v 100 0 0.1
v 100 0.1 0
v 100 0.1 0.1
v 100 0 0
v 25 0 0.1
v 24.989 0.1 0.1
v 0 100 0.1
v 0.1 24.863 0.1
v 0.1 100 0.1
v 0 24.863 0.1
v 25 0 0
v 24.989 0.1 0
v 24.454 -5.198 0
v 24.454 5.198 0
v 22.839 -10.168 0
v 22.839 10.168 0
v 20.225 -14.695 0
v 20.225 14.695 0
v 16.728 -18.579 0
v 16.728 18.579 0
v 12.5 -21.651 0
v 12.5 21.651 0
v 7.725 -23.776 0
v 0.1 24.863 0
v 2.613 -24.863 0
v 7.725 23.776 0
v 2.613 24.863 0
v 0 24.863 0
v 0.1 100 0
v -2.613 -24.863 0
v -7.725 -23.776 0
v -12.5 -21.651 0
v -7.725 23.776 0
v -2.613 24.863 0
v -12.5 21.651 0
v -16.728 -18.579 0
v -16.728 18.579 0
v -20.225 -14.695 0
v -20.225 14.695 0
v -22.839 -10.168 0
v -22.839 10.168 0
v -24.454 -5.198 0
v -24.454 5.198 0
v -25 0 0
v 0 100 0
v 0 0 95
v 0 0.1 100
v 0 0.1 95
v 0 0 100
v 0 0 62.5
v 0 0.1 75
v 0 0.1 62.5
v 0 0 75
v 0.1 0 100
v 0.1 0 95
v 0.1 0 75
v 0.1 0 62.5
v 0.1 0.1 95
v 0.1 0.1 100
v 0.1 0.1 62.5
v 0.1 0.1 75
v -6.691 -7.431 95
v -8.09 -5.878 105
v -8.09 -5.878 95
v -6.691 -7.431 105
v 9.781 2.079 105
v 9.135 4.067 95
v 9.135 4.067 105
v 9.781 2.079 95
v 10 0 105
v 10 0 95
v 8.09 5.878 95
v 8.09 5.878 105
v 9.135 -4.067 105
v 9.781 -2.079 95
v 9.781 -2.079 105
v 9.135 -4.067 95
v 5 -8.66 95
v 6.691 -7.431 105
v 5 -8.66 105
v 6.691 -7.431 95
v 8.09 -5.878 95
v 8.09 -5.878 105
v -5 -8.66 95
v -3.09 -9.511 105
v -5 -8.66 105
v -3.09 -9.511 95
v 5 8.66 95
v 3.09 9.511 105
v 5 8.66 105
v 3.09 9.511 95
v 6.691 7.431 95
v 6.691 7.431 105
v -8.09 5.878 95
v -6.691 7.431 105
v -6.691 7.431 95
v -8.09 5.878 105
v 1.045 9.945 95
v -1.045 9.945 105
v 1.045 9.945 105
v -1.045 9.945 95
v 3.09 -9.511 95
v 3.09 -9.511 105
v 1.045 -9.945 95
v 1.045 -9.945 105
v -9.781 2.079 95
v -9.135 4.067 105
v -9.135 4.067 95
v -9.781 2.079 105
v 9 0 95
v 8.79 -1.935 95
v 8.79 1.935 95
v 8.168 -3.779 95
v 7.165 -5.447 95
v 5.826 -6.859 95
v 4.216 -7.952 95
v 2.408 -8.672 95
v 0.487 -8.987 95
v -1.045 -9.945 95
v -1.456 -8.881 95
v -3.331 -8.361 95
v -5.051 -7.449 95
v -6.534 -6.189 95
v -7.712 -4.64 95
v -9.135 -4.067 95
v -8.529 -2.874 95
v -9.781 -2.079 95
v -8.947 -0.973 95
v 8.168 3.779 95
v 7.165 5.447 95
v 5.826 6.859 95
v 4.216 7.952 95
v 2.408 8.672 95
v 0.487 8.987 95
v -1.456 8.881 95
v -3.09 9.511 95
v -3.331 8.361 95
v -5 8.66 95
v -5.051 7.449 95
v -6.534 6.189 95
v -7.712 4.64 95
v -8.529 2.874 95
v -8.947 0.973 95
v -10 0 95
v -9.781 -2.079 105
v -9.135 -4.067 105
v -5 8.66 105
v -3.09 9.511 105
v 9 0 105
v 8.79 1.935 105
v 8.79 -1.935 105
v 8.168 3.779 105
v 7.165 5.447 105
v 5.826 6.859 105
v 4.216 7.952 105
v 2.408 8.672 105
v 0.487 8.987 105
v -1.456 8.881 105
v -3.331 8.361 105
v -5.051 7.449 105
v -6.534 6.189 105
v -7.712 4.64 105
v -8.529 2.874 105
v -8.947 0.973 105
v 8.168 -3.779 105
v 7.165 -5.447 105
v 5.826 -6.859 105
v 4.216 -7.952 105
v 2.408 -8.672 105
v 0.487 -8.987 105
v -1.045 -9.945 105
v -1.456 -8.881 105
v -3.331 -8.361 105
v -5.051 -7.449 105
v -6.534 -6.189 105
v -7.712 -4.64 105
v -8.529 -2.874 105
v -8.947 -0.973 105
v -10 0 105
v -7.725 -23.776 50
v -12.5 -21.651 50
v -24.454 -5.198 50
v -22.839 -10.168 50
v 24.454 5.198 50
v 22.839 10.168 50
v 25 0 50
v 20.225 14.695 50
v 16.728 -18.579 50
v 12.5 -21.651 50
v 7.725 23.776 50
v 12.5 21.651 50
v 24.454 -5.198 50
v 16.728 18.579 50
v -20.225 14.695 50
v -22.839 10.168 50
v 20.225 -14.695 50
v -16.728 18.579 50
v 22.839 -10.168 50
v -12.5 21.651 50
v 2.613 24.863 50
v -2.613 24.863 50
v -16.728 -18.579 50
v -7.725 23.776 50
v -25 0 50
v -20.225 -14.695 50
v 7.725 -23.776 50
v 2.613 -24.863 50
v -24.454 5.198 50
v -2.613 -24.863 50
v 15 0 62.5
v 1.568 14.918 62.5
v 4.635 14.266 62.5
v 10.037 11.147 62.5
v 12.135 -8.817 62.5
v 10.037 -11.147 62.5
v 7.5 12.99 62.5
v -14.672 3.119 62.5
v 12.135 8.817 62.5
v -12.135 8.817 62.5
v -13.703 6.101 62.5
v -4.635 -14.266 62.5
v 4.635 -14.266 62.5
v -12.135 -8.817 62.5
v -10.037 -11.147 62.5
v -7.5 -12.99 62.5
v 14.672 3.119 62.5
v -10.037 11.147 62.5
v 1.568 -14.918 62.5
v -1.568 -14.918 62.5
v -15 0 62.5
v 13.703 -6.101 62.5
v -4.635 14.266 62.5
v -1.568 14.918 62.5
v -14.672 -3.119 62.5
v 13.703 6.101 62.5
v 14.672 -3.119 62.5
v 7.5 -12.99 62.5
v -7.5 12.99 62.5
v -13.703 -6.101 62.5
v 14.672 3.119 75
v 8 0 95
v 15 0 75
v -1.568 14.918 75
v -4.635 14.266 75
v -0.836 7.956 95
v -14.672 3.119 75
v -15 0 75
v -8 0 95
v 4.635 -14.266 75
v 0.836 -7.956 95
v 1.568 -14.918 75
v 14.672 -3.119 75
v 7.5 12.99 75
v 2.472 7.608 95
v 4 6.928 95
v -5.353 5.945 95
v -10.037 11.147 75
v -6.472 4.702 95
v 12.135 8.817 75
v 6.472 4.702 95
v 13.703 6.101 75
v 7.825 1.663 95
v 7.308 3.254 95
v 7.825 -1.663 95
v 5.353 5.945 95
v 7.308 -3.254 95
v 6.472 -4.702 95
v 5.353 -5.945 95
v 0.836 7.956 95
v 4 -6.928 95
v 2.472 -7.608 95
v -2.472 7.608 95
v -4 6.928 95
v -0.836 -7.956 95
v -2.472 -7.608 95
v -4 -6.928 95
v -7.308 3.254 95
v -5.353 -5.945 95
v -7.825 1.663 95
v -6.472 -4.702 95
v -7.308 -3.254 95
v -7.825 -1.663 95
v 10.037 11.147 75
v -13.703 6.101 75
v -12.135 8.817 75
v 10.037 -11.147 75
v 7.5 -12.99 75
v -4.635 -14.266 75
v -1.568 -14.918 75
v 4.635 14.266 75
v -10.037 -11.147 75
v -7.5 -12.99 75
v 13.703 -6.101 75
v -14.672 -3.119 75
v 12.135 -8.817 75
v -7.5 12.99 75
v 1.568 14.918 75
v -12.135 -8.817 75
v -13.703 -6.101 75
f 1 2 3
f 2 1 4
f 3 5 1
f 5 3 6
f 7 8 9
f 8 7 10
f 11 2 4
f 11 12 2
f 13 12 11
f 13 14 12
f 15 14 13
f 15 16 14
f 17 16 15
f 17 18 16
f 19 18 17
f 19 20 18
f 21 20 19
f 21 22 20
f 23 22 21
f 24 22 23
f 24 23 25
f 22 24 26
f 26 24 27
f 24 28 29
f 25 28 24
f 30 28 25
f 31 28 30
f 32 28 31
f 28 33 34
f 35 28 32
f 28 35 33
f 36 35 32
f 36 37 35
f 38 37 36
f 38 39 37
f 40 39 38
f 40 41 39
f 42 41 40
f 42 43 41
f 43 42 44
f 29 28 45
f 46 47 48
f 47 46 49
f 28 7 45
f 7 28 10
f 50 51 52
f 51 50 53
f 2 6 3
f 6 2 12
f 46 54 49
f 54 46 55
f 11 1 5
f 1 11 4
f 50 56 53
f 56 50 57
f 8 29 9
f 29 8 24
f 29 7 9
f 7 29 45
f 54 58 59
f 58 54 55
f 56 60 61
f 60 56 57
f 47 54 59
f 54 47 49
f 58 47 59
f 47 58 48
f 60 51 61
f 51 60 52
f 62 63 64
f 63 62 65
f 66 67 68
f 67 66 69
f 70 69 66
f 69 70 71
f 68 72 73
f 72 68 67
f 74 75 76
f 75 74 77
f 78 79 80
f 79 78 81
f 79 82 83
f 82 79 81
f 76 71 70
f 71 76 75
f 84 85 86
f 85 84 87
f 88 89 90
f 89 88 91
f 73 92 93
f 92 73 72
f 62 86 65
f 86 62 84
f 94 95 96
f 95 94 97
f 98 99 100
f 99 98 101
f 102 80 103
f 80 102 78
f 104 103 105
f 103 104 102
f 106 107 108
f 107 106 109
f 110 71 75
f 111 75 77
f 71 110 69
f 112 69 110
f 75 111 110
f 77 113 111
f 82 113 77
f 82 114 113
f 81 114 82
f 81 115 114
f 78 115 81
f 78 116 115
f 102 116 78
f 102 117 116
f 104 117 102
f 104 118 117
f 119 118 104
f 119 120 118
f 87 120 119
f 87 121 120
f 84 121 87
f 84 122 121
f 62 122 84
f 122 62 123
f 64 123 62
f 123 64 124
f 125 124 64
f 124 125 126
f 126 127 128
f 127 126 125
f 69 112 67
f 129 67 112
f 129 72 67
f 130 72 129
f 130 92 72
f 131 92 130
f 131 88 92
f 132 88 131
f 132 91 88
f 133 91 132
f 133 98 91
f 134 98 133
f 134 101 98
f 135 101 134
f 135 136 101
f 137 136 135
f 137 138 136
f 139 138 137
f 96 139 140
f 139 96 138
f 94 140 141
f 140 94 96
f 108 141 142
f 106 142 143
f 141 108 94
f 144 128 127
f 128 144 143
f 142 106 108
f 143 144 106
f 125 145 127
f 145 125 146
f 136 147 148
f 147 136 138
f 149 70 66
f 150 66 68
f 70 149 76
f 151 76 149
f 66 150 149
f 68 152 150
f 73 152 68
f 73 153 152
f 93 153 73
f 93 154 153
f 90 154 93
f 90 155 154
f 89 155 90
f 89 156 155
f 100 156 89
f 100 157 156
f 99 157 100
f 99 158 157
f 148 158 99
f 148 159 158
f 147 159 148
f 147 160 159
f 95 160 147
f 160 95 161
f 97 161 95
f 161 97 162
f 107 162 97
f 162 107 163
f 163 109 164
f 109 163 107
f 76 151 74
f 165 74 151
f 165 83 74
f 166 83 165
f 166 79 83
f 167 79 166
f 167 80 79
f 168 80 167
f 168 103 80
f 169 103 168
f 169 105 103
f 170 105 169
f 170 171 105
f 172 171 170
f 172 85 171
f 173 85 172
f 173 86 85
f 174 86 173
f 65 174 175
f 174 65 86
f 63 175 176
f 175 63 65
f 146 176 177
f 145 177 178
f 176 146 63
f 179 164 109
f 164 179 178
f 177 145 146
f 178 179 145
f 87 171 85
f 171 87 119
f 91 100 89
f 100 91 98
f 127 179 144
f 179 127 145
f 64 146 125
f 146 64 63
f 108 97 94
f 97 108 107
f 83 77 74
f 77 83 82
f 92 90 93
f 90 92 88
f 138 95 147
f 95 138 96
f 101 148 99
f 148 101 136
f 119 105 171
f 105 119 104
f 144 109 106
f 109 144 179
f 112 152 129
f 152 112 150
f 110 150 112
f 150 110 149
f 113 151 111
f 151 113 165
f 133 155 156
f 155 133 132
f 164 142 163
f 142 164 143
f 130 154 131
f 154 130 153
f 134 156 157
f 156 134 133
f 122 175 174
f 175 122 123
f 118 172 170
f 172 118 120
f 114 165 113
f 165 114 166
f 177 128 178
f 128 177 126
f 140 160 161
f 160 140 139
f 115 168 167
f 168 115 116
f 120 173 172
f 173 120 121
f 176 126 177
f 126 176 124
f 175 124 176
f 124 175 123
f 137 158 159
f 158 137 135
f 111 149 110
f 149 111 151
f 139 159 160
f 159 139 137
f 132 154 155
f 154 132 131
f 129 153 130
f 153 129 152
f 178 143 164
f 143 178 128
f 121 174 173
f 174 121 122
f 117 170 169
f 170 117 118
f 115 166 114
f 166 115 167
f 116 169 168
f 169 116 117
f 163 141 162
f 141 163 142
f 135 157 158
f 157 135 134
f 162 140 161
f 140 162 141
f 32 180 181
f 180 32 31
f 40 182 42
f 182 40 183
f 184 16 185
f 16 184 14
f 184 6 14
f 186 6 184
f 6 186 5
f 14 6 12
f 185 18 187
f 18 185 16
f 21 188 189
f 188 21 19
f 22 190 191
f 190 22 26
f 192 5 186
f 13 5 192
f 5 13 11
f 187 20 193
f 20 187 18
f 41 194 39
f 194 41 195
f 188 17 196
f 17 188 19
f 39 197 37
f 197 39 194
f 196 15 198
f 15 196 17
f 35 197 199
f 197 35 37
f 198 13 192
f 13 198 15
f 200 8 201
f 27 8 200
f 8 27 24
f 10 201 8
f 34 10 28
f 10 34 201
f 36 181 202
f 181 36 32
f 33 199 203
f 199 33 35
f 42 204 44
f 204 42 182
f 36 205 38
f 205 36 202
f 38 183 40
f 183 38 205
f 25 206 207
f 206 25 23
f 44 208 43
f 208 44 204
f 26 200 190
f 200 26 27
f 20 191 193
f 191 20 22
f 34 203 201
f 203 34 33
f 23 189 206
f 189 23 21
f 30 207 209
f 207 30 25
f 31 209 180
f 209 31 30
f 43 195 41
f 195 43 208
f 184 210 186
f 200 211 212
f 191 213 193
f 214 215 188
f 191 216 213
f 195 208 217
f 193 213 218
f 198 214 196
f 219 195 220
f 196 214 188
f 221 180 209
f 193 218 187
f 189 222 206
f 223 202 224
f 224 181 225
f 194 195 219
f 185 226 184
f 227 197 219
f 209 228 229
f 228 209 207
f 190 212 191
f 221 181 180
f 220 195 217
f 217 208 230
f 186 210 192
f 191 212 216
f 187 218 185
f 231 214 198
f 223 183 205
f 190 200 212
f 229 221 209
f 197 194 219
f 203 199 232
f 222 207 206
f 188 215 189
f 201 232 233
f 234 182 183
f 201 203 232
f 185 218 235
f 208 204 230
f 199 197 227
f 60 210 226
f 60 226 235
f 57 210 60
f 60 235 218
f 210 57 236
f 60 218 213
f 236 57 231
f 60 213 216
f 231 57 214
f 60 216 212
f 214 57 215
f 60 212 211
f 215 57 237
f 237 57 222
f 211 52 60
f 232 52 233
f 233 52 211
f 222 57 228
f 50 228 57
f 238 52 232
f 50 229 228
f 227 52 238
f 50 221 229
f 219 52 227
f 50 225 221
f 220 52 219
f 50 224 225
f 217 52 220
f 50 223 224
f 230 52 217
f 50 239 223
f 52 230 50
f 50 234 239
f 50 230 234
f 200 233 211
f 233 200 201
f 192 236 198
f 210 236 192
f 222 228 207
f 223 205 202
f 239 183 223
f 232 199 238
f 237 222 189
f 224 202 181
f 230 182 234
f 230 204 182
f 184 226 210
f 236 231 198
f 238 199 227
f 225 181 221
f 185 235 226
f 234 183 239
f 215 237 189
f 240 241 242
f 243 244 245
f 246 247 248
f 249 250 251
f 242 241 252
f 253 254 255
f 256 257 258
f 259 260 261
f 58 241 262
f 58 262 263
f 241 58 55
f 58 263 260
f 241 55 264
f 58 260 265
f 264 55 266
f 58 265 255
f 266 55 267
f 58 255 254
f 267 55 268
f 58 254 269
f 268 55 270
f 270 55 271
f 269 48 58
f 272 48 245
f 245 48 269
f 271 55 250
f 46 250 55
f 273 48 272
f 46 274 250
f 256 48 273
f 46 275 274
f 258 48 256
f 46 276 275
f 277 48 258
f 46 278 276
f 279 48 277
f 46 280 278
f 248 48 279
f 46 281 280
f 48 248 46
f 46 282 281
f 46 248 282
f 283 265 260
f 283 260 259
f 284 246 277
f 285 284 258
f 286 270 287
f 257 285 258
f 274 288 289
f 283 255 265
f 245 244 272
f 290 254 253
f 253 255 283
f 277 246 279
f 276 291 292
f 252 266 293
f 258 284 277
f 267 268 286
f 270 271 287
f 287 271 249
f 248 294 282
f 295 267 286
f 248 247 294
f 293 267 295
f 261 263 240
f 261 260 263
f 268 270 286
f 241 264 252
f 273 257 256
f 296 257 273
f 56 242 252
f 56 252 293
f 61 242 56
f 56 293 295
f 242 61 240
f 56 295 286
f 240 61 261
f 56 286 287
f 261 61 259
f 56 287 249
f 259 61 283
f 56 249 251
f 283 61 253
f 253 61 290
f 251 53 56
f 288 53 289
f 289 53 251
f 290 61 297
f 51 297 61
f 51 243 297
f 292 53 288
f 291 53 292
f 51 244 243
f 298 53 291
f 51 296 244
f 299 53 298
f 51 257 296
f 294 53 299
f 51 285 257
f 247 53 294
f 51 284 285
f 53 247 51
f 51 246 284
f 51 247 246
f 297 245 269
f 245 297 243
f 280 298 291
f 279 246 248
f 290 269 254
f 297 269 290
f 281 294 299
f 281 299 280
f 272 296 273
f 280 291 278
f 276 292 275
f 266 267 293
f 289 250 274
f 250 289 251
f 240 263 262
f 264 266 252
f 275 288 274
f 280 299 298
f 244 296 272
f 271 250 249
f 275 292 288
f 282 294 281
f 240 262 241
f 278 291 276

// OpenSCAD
    // Combined Scene

    // Permanent Model
    
    // Permanent Model (Black)
    color([0, 0, 0]) {
        // Your permanent model code here
        cube([100,0.1,0.1], center = false);
        cube([0.1,100,0.1], center = false);
        cube([0.1,0.1,100], center = false);
    }
    

    // Dynamic Model
    cylinder(h = 50, r = 25); // Main body
translate([0, 0, 50]) {
    scale([1, 1, 0.5]) 
        cylinder(h = 25, r1 = 25, r2 = 15); // Tapered shoulder
}
translate([0, 0, 75]) {
    cylinder(h = 20, r1 = 15, r2 = 8); // Tapered neck
}
translate([0, 0, 95]) {
    difference() {
        cylinder(h = 10, r = 10); // Cap body
        translate([0, 0, -1]) 
            cylinder(h = 11, r = 9); // Indentation for cap
    }
}
translate([0, 0, 80]) {
    for (i = [0 : 11]) {
        rotate(i * 30) {
            translate([0, 7, 0]) {
                cube([1, 0.4, 5]); // Ribbed texture on neck
            }
        }
    }
}
translate([0, 0, 30]) {
    for (i = [0 : 5]) {
        rotate(i * 60) {
            translate([0, 23, 0]) {
                cube([1.5, 0.5, 7]); // Labeling detail on body
            }
        }
    }
}
    
